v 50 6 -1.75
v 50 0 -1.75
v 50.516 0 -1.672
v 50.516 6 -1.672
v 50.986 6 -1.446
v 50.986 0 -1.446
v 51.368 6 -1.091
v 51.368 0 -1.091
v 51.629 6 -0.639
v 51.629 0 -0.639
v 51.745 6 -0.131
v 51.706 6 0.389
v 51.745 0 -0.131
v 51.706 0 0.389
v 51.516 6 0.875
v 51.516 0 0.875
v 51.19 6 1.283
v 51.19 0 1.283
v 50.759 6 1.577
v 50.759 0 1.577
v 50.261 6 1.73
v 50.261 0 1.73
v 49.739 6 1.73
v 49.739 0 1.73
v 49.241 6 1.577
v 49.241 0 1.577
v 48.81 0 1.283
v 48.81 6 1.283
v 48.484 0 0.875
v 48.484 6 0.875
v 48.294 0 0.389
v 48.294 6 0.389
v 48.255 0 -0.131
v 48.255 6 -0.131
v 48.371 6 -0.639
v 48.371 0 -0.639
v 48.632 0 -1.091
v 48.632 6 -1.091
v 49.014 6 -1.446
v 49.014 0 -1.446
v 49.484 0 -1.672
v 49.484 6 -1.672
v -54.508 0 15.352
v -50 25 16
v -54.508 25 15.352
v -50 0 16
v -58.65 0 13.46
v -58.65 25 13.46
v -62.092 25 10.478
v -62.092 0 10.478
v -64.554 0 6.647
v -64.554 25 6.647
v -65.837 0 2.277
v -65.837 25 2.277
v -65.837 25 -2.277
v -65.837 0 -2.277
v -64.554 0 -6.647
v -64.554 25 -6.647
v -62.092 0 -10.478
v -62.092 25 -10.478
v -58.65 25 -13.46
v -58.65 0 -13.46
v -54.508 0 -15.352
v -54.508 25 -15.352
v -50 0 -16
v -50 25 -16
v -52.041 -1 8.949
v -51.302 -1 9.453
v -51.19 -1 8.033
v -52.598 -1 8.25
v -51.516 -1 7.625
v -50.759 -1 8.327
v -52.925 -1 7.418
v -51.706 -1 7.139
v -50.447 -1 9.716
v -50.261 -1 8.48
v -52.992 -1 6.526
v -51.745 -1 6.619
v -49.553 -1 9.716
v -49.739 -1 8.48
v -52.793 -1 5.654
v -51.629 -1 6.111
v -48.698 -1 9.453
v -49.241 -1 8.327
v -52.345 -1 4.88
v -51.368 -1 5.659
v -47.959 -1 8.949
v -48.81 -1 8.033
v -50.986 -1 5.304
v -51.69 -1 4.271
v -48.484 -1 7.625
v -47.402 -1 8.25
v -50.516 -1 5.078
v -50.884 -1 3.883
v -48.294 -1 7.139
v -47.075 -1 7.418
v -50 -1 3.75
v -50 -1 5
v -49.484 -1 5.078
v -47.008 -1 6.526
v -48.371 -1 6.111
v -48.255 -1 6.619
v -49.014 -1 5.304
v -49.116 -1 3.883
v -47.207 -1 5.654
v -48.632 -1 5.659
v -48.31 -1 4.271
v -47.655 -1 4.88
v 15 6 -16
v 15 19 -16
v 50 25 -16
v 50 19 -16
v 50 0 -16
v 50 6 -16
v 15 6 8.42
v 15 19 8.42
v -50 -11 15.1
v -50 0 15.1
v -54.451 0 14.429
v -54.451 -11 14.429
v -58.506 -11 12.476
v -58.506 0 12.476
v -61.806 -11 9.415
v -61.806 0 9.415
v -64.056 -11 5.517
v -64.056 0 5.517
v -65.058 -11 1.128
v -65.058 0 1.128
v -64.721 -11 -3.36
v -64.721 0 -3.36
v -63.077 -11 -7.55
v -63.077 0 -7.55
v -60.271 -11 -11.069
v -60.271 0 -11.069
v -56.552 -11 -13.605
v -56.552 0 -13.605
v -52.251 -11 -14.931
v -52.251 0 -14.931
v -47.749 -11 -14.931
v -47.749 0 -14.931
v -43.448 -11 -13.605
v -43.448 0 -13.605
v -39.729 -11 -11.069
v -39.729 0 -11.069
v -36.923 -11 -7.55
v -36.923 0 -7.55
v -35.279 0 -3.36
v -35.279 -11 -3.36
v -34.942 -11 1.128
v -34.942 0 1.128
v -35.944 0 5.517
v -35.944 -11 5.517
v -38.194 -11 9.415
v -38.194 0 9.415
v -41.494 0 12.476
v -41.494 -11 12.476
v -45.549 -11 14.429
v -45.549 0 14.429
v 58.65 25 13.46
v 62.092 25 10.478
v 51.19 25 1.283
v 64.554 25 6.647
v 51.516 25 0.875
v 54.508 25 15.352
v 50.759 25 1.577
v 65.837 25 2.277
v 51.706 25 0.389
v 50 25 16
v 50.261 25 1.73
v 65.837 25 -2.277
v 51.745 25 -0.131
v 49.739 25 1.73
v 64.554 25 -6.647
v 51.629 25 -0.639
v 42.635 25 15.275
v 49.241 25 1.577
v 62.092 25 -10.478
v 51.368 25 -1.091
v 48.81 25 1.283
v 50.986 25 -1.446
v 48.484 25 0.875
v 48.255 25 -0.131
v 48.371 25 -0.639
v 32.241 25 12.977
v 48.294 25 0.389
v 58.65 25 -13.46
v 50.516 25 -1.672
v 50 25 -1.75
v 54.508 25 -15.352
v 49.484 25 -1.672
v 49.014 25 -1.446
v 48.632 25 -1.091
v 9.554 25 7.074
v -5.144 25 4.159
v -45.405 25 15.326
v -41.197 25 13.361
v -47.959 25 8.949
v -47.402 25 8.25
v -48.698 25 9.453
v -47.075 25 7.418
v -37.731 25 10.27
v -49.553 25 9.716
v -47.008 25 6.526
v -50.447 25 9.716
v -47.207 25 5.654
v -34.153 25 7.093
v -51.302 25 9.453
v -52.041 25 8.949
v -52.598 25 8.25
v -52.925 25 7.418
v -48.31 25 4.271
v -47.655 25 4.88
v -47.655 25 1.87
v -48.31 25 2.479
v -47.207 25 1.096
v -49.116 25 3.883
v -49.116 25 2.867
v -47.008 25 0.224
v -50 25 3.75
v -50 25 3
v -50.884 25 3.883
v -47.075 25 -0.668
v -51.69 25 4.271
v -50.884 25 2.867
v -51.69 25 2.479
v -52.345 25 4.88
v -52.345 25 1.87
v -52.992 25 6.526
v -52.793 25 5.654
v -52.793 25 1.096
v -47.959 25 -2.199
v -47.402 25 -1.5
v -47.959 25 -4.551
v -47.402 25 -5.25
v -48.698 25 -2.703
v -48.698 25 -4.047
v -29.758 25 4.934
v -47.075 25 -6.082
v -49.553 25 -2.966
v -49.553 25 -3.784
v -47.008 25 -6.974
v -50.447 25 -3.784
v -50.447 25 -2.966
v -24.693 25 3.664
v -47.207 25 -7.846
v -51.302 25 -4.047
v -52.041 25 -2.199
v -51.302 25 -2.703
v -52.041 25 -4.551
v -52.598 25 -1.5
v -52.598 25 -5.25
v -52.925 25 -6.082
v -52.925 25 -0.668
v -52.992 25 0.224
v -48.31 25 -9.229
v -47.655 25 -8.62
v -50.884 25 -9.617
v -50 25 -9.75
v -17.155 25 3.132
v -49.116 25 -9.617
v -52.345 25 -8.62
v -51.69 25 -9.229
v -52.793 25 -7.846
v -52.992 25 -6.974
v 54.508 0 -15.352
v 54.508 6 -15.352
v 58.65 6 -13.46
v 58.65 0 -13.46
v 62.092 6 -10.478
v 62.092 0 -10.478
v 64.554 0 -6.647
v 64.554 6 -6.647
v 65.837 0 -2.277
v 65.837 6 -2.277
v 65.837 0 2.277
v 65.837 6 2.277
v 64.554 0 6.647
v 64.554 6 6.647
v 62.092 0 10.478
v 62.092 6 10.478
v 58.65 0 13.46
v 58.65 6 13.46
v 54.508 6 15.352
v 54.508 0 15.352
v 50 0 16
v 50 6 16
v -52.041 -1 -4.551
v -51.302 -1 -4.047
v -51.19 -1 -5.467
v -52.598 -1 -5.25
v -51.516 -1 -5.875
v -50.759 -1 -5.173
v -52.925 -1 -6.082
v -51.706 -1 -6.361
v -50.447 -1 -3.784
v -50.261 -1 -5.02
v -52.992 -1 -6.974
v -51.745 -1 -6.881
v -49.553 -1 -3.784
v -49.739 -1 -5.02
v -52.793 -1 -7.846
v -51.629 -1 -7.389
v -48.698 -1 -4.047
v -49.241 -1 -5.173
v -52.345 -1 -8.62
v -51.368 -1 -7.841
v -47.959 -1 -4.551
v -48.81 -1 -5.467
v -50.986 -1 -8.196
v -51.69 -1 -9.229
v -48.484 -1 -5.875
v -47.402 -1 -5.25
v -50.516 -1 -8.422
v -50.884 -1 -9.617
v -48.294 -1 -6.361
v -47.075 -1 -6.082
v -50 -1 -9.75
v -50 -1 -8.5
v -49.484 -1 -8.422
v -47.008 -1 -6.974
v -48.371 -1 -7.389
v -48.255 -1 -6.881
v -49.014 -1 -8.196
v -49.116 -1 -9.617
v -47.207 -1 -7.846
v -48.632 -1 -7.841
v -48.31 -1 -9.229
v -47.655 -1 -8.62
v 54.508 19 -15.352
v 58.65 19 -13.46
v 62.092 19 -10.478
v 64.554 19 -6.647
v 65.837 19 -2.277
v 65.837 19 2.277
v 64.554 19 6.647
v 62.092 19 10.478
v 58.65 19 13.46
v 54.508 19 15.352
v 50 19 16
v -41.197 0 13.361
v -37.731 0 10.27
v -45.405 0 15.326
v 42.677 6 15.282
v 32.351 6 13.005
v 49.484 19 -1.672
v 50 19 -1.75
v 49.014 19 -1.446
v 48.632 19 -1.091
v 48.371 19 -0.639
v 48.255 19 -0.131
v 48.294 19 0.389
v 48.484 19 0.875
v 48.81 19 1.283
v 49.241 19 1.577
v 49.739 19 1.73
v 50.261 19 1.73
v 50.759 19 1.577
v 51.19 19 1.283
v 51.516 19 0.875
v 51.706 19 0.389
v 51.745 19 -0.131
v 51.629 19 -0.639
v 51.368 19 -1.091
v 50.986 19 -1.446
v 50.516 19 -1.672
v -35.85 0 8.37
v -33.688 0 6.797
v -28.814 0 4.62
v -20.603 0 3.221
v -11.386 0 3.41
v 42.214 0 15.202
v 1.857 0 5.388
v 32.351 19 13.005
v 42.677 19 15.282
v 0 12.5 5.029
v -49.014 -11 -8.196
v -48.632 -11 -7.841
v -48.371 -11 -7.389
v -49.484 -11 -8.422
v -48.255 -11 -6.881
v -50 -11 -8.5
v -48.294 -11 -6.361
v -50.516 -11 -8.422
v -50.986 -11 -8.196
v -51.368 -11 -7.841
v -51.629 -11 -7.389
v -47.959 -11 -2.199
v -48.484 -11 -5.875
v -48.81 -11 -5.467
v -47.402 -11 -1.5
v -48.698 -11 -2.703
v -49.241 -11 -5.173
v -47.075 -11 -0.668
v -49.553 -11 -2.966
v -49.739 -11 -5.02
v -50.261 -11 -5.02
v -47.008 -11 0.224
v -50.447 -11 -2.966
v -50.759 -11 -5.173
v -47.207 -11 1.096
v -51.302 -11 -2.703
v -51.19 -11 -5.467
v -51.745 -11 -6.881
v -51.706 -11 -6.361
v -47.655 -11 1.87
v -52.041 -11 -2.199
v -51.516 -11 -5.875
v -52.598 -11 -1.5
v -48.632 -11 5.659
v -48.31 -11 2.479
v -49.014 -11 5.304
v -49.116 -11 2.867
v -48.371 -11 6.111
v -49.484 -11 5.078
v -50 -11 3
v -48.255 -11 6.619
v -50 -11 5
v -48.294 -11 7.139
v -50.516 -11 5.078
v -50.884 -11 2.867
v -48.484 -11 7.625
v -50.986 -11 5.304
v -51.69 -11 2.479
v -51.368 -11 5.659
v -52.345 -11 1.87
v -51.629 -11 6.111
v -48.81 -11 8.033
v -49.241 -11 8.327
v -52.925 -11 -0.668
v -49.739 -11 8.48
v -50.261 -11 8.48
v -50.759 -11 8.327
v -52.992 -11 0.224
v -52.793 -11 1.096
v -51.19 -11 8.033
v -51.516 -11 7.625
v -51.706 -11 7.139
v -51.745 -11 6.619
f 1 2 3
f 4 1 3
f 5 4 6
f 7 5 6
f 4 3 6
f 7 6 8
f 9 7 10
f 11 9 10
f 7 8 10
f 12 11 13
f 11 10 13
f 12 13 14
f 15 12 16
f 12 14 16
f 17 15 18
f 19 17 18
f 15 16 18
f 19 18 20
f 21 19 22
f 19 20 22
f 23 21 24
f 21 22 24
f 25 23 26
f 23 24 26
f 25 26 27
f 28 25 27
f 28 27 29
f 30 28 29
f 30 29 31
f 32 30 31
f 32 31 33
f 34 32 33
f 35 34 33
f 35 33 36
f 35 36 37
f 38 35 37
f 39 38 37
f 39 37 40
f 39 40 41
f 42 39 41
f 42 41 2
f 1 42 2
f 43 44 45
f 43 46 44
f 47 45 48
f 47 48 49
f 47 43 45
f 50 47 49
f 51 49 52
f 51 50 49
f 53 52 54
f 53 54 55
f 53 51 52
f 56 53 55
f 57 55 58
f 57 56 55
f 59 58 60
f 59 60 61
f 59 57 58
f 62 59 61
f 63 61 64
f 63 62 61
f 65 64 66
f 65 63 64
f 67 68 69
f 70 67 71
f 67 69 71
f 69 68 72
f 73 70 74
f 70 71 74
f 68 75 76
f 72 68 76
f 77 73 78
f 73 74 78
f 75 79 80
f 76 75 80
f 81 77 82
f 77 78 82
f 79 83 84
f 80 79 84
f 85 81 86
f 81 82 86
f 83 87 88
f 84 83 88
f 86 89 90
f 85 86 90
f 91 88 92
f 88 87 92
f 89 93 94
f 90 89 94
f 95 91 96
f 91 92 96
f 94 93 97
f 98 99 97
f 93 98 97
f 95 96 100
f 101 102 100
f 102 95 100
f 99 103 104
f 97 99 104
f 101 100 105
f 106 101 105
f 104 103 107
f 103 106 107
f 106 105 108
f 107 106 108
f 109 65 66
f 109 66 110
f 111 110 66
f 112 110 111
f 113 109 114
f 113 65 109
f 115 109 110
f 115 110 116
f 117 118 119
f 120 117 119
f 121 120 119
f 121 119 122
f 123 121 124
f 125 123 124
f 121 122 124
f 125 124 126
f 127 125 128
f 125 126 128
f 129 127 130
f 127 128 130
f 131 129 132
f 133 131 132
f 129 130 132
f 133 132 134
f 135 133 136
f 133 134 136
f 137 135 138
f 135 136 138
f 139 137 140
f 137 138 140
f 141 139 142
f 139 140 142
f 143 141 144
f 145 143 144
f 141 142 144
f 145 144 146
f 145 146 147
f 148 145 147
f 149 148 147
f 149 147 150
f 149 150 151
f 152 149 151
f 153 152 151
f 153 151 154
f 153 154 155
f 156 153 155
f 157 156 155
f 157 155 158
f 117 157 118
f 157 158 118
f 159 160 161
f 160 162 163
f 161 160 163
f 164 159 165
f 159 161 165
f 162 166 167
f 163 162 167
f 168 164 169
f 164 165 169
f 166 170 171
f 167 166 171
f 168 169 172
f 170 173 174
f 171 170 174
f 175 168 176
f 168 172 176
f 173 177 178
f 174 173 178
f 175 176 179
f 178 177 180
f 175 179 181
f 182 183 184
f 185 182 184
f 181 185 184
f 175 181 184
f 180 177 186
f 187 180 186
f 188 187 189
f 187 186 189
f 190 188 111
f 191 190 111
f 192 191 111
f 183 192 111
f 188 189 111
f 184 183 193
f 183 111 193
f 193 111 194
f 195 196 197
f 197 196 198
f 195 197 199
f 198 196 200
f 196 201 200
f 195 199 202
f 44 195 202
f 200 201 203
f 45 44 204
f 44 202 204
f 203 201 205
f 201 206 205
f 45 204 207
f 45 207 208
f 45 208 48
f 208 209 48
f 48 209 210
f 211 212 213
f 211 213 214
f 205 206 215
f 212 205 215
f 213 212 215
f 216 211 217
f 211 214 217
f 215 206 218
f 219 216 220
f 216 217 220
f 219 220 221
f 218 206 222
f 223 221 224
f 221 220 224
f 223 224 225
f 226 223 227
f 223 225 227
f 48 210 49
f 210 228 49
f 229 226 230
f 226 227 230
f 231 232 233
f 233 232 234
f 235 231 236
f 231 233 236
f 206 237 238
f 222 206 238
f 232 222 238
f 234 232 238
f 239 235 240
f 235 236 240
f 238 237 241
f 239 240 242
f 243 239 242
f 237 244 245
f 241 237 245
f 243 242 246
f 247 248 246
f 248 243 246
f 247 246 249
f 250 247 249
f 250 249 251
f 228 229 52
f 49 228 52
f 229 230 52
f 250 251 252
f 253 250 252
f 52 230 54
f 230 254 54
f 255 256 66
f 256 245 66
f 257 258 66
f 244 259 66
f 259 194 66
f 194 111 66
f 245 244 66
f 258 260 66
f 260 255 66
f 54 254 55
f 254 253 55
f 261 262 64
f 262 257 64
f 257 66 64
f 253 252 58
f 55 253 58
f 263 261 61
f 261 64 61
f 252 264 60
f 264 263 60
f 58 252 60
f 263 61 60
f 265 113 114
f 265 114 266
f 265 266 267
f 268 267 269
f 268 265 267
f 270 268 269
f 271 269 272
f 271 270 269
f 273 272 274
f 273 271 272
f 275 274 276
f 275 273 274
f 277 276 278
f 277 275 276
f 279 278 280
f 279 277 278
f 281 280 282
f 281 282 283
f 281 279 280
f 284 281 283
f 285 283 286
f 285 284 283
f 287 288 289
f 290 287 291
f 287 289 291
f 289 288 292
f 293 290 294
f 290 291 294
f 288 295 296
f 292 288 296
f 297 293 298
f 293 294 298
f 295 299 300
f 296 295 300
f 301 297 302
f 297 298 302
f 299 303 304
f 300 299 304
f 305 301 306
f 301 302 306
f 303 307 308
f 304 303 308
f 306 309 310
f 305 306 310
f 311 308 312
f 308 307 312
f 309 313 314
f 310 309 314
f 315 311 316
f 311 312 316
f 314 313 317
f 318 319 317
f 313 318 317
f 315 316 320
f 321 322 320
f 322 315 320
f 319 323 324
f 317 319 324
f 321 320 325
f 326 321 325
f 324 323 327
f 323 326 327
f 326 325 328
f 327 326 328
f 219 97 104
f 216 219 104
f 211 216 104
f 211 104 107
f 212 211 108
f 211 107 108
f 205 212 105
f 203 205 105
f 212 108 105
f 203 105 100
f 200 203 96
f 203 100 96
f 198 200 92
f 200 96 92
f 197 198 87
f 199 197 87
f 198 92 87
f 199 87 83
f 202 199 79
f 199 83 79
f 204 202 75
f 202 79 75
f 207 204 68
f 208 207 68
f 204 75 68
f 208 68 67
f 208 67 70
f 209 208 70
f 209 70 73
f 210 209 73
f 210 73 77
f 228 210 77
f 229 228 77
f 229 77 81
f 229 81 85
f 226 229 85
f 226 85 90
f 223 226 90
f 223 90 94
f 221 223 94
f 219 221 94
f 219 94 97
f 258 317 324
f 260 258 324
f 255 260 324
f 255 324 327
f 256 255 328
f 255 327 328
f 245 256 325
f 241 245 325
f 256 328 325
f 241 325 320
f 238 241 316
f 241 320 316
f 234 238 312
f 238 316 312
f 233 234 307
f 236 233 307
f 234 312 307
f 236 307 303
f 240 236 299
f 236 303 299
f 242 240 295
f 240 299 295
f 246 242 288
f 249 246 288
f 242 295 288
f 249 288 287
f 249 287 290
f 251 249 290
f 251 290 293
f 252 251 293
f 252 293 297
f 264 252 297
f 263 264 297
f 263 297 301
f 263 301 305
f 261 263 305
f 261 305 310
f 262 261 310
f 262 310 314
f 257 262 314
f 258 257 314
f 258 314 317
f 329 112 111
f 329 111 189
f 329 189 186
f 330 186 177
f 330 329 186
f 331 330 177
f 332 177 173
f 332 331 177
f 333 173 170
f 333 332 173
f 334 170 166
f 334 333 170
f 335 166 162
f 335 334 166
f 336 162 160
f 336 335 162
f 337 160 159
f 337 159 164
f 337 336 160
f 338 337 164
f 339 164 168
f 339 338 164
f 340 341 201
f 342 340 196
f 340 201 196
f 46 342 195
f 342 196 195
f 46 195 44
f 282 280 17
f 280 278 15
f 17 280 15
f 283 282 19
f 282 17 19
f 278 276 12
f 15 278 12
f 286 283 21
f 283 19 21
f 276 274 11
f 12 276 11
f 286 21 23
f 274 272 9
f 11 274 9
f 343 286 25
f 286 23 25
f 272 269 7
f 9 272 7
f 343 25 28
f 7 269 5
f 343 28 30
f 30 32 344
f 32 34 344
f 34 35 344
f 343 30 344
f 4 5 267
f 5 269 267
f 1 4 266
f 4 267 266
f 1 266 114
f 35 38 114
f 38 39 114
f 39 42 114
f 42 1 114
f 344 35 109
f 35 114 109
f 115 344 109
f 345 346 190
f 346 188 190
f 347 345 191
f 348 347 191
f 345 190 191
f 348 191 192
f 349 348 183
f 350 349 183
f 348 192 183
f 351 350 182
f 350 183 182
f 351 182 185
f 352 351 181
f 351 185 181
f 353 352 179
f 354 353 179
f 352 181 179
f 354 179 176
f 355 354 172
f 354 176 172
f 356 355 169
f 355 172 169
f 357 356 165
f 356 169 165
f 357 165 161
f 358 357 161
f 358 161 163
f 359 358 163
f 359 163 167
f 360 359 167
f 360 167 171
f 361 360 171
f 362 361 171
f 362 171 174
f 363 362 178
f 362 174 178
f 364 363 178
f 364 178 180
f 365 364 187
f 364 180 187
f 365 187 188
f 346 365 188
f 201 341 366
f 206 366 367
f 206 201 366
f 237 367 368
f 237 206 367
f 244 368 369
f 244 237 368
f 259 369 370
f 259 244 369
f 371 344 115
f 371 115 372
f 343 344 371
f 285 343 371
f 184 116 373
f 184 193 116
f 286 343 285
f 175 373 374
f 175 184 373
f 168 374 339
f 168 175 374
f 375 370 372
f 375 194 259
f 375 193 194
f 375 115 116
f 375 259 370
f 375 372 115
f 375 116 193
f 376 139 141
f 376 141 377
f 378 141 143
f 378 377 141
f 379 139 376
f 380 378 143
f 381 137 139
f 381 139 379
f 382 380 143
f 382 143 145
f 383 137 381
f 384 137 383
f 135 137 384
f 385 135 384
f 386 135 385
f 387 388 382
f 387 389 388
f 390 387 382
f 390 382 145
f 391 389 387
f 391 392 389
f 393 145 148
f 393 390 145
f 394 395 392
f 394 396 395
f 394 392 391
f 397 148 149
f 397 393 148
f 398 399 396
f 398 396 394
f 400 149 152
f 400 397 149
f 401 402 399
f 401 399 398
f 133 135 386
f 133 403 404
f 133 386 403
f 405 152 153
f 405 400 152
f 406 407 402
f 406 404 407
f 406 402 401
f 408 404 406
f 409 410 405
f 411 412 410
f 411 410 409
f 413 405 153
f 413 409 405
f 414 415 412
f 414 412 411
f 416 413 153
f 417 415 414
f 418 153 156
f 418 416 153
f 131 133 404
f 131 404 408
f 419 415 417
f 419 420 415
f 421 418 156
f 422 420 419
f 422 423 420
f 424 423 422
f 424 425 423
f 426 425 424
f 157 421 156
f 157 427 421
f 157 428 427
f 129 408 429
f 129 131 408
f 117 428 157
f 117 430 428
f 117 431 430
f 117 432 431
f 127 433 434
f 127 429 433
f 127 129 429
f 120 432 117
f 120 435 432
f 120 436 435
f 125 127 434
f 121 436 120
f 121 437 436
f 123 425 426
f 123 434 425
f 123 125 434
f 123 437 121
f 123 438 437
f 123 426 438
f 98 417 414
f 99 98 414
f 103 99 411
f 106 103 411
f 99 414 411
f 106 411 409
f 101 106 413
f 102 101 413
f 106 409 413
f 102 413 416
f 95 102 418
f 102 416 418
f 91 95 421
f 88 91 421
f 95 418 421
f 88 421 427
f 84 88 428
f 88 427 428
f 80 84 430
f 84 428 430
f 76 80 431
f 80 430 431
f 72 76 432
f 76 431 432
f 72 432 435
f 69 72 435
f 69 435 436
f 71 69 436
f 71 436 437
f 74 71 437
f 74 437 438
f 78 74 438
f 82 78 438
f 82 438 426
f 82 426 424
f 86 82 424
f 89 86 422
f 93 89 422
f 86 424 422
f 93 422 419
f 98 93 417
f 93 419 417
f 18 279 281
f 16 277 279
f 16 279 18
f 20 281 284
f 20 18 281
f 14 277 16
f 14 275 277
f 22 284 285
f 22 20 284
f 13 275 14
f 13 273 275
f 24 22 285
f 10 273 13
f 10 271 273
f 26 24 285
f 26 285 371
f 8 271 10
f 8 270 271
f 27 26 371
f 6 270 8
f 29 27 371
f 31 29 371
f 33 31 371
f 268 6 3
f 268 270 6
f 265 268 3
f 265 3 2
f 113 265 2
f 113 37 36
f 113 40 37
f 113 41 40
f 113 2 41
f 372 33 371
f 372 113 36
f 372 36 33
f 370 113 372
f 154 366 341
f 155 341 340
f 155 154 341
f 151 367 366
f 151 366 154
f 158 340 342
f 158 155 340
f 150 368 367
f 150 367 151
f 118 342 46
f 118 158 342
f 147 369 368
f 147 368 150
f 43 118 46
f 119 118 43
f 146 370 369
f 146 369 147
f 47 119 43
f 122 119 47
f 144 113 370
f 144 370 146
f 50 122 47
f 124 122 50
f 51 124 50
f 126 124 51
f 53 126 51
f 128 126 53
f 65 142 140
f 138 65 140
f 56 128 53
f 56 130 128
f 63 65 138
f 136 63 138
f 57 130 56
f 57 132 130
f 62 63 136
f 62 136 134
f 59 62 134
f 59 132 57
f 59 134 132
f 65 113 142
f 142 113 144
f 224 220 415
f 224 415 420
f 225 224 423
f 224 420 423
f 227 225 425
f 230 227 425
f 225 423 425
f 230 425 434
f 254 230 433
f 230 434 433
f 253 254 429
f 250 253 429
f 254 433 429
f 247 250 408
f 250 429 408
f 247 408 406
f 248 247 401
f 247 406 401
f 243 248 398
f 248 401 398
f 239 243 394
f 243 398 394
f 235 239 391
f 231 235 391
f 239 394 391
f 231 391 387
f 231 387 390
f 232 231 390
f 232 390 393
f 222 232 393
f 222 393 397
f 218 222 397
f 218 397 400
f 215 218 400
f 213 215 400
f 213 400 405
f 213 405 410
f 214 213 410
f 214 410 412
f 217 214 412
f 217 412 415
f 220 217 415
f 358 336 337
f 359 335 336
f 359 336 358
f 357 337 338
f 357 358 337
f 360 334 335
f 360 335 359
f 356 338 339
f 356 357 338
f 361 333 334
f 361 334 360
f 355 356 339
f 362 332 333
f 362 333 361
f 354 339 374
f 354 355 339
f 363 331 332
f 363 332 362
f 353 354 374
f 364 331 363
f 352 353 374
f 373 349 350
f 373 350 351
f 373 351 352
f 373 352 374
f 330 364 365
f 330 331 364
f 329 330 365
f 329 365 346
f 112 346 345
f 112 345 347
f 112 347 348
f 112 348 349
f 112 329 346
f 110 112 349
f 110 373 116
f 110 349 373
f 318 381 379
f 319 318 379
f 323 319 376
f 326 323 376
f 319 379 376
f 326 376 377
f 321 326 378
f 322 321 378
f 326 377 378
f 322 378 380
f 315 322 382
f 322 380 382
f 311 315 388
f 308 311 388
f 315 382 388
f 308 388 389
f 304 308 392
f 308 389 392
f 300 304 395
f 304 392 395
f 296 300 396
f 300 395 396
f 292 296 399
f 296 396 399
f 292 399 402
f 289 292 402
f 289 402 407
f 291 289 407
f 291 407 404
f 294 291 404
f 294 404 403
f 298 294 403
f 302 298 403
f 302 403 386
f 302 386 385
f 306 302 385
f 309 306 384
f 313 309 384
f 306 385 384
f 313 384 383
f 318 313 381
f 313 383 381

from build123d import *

# Parameters (mm, degrees)
BOSS_EXTRUDE1_DEPTH            = 6
SKETCH3_R                      = 1.75
CUT_EXTRUDE2_DEPTH             = 69.176242196
BOSS_EXTRUDE2_DEPTH            = 13
BOSS_EXTRUDE3_DEPTH            = 6
CUT_EXTRUDE3_REACH             = 74.367
SKETCH6_R                      = 1.75
CUT_EXTRUDE4_REACH             = 74.367
SKETCH8_R                      = 15.1
BOSS_EXTRUDE4_DEPTH            = 11
SKETCH9_R                      = 1.75
CUT_EXTRUDE5_DEPTH             = 10
CUT_EXTRUDE6_REACH             = 78.864
SKETCH11_R                     = 3
CUT_EXTRUDE6_DIRECTION_2_DEPTH = 77.863515556
CUT_EXTRUDE7_REACH             = 74.719
SKETCH12_R                     = 3


with BuildPart() as part:
    # Sketch1 → Boss-Extrude1 (new body)
    with BuildSketch(Plane(origin=(0, 0, 0), x_dir=(1, 0, 0), z_dir=(0, 1, 0))):
        with BuildLine():
            Line((-50, 16), (50, 16))
            ThreePointArc((50, 16), (66, 0), (50, -16))
            Line((50, -16), (-50, -16))
            ThreePointArc((-50, -16), (-66, 0), (-50, 16))
        make_face()
    extrude(amount=BOSS_EXTRUDE1_DEPTH)

    # Sketch3 → Cut-Extrude2 (cut, through all)
    with BuildSketch(Plane.XZ):
        with Locations(Location((50, 0, 0), (0, 0, 270))):
            Circle(SKETCH3_R)
    extrude(amount=-CUT_EXTRUDE2_DEPTH, mode=Mode.SUBTRACT)

    # Sketch4 → Boss-Extrude2 (add)
    with BuildSketch(Plane(origin=(0, 6, 0), x_dir=(1, 0, 0), z_dir=(0, 1, 0))):
        with BuildLine():
            Line((-50, 16), (15, 16))
            Line((15, 16), (15, -16))
            Line((15, -16), (-50, -16))
            ThreePointArc((-50, -16), (-66, 0), (-50, 16))
        make_face()
    extrude(amount=BOSS_EXTRUDE2_DEPTH)

    # Sketch5 → Boss-Extrude3 (add)
    with BuildSketch(Plane(origin=(0, 19, 0), x_dir=(1, 0, 0), z_dir=(0, 1, 0))):
        with BuildLine():
            Line((-50, 16), (50, 16))
            ThreePointArc((50, 16), (66, 0), (50, -16))
            Line((50, -16), (-50, -16))
            ThreePointArc((-50, -16), (-66, 0), (-50, 16))
        make_face()
    extrude(amount=BOSS_EXTRUDE3_DEPTH)

    # Sketch6 → Cut-Extrude3 (cut, up to next)
    with BuildSketch(Plane(origin=(0, 25, 0), x_dir=(1, 0, 0), z_dir=(0, 1, 0)), mode=Mode.PRIVATE) as cut_extrude3_sk1:
        with Locations(Location((50, 0, 0), (0, 0, 90))):
            Circle(SKETCH6_R)
    cut_extrude3_tool1 = extrude(cut_extrude3_sk1.sketch, amount=-CUT_EXTRUDE3_REACH, mode=Mode.PRIVATE) & part.part
    add(cut_extrude3_tool1.solids().sort_by_distance((50, 25, 0))[0], mode=Mode.SUBTRACT)

    # Sketch7 → Cut-Extrude4 (cut, up to next)
    with BuildSketch(Plane(origin=(0, 25, 0), x_dir=(1, 0, 0), z_dir=(0, 1, 0)), mode=Mode.PRIVATE) as cut_extrude4_sk1:
        with BuildLine():
            ThreePointArc((-37.731263809, -10.270253759), (-43.22962557, -14.496966237), (-50, -16))
            Line((-50, -16), (50, -16))
            add(Edge.make_bspline(
                [(-37.731263809, -10.270253759), (-30.332556703, -1.431836739), (6.050402888, -3.364587973), (38.512231583, -16), (50, -16)],
                knots=[0, 0, 0, 0, 0.426660683, 1, 1, 1, 1], degree=3))
        make_face()
    cut_extrude4_tool1 = extrude(cut_extrude4_sk1.sketch, amount=-CUT_EXTRUDE4_REACH, mode=Mode.PRIVATE) & part.part
    add(cut_extrude4_tool1.solids().sort_by_distance((-6.915299, 25, 11.013102))[0], mode=Mode.SUBTRACT)

    # Sketch8 → Boss-Extrude4 (add)
    with BuildSketch(Plane.XZ):
        with Locations(Location((-50, 0, 0), (0, 0, 90))):
            Circle(SKETCH8_R)
    extrude(amount=BOSS_EXTRUDE4_DEPTH)

    # Sketch9 → Cut-Extrude5 (cut)
    with BuildSketch(Plane.XZ.offset(11)):
        with Locations(Location((-50, 6.75, 0), (0, 0, 270))):
            Circle(SKETCH9_R)
        with Locations(Location((-50, -6.75, 0), (0, 0, 270))):
            Circle(SKETCH9_R)
    extrude(amount=-CUT_EXTRUDE5_DEPTH, mode=Mode.SUBTRACT)

    # Sketch11 → Cut-Extrude6 (cut, up to next)
    with BuildSketch(Plane.XZ.offset(11), mode=Mode.PRIVATE) as cut_extrude6_sk1:
        with Locations(Location((-50, 0, 0), (0, 0, 90))):
            Circle(SKETCH11_R)
    cut_extrude6_tool1 = extrude(cut_extrude6_sk1.sketch, amount=-CUT_EXTRUDE6_REACH, mode=Mode.PRIVATE) & part.part
    add(cut_extrude6_tool1.solids().sort_by_distance((-50, -11, 0))[0], mode=Mode.SUBTRACT)

    # Sketch11 → Cut-Extrude6 direction 2 (cut)
    with BuildSketch(Plane.XZ.offset(11)):
        with Locations(Location((-50, 0, 0), (0, 0, 90))):
            Circle(SKETCH11_R)
    extrude(amount=CUT_EXTRUDE6_DIRECTION_2_DEPTH, mode=Mode.SUBTRACT)

    # Sketch12 → Cut-Extrude7 (cut, up to next)
    with BuildSketch(Plane.XZ.offset(1), mode=Mode.PRIVATE) as cut_extrude7_sk1:
        with Locations(Location((-50, 6.75, 0), (0, 0, 270))):
            Circle(SKETCH12_R)
    cut_extrude7_tool1 = extrude(cut_extrude7_sk1.sketch, amount=-CUT_EXTRUDE7_REACH, mode=Mode.PRIVATE) & part.part
    # Sketch12 → Cut-Extrude7 (cut, up to next)
    with BuildSketch(Plane.XZ.offset(1), mode=Mode.PRIVATE) as cut_extrude7_sk2:
        with Locations(Location((-50, -6.75, 0), (0, 0, 270))):
            Circle(SKETCH12_R)
    cut_extrude7_tool2 = extrude(cut_extrude7_sk2.sketch, amount=-CUT_EXTRUDE7_REACH, mode=Mode.PRIVATE) & part.part
    add(cut_extrude7_tool1.solids().sort_by_distance((-50, -1, 6.75))[0], mode=Mode.SUBTRACT)
    add(cut_extrude7_tool2.solids().sort_by_distance((-50, -1, -6.75))[0], mode=Mode.SUBTRACT)


solid = part.part
